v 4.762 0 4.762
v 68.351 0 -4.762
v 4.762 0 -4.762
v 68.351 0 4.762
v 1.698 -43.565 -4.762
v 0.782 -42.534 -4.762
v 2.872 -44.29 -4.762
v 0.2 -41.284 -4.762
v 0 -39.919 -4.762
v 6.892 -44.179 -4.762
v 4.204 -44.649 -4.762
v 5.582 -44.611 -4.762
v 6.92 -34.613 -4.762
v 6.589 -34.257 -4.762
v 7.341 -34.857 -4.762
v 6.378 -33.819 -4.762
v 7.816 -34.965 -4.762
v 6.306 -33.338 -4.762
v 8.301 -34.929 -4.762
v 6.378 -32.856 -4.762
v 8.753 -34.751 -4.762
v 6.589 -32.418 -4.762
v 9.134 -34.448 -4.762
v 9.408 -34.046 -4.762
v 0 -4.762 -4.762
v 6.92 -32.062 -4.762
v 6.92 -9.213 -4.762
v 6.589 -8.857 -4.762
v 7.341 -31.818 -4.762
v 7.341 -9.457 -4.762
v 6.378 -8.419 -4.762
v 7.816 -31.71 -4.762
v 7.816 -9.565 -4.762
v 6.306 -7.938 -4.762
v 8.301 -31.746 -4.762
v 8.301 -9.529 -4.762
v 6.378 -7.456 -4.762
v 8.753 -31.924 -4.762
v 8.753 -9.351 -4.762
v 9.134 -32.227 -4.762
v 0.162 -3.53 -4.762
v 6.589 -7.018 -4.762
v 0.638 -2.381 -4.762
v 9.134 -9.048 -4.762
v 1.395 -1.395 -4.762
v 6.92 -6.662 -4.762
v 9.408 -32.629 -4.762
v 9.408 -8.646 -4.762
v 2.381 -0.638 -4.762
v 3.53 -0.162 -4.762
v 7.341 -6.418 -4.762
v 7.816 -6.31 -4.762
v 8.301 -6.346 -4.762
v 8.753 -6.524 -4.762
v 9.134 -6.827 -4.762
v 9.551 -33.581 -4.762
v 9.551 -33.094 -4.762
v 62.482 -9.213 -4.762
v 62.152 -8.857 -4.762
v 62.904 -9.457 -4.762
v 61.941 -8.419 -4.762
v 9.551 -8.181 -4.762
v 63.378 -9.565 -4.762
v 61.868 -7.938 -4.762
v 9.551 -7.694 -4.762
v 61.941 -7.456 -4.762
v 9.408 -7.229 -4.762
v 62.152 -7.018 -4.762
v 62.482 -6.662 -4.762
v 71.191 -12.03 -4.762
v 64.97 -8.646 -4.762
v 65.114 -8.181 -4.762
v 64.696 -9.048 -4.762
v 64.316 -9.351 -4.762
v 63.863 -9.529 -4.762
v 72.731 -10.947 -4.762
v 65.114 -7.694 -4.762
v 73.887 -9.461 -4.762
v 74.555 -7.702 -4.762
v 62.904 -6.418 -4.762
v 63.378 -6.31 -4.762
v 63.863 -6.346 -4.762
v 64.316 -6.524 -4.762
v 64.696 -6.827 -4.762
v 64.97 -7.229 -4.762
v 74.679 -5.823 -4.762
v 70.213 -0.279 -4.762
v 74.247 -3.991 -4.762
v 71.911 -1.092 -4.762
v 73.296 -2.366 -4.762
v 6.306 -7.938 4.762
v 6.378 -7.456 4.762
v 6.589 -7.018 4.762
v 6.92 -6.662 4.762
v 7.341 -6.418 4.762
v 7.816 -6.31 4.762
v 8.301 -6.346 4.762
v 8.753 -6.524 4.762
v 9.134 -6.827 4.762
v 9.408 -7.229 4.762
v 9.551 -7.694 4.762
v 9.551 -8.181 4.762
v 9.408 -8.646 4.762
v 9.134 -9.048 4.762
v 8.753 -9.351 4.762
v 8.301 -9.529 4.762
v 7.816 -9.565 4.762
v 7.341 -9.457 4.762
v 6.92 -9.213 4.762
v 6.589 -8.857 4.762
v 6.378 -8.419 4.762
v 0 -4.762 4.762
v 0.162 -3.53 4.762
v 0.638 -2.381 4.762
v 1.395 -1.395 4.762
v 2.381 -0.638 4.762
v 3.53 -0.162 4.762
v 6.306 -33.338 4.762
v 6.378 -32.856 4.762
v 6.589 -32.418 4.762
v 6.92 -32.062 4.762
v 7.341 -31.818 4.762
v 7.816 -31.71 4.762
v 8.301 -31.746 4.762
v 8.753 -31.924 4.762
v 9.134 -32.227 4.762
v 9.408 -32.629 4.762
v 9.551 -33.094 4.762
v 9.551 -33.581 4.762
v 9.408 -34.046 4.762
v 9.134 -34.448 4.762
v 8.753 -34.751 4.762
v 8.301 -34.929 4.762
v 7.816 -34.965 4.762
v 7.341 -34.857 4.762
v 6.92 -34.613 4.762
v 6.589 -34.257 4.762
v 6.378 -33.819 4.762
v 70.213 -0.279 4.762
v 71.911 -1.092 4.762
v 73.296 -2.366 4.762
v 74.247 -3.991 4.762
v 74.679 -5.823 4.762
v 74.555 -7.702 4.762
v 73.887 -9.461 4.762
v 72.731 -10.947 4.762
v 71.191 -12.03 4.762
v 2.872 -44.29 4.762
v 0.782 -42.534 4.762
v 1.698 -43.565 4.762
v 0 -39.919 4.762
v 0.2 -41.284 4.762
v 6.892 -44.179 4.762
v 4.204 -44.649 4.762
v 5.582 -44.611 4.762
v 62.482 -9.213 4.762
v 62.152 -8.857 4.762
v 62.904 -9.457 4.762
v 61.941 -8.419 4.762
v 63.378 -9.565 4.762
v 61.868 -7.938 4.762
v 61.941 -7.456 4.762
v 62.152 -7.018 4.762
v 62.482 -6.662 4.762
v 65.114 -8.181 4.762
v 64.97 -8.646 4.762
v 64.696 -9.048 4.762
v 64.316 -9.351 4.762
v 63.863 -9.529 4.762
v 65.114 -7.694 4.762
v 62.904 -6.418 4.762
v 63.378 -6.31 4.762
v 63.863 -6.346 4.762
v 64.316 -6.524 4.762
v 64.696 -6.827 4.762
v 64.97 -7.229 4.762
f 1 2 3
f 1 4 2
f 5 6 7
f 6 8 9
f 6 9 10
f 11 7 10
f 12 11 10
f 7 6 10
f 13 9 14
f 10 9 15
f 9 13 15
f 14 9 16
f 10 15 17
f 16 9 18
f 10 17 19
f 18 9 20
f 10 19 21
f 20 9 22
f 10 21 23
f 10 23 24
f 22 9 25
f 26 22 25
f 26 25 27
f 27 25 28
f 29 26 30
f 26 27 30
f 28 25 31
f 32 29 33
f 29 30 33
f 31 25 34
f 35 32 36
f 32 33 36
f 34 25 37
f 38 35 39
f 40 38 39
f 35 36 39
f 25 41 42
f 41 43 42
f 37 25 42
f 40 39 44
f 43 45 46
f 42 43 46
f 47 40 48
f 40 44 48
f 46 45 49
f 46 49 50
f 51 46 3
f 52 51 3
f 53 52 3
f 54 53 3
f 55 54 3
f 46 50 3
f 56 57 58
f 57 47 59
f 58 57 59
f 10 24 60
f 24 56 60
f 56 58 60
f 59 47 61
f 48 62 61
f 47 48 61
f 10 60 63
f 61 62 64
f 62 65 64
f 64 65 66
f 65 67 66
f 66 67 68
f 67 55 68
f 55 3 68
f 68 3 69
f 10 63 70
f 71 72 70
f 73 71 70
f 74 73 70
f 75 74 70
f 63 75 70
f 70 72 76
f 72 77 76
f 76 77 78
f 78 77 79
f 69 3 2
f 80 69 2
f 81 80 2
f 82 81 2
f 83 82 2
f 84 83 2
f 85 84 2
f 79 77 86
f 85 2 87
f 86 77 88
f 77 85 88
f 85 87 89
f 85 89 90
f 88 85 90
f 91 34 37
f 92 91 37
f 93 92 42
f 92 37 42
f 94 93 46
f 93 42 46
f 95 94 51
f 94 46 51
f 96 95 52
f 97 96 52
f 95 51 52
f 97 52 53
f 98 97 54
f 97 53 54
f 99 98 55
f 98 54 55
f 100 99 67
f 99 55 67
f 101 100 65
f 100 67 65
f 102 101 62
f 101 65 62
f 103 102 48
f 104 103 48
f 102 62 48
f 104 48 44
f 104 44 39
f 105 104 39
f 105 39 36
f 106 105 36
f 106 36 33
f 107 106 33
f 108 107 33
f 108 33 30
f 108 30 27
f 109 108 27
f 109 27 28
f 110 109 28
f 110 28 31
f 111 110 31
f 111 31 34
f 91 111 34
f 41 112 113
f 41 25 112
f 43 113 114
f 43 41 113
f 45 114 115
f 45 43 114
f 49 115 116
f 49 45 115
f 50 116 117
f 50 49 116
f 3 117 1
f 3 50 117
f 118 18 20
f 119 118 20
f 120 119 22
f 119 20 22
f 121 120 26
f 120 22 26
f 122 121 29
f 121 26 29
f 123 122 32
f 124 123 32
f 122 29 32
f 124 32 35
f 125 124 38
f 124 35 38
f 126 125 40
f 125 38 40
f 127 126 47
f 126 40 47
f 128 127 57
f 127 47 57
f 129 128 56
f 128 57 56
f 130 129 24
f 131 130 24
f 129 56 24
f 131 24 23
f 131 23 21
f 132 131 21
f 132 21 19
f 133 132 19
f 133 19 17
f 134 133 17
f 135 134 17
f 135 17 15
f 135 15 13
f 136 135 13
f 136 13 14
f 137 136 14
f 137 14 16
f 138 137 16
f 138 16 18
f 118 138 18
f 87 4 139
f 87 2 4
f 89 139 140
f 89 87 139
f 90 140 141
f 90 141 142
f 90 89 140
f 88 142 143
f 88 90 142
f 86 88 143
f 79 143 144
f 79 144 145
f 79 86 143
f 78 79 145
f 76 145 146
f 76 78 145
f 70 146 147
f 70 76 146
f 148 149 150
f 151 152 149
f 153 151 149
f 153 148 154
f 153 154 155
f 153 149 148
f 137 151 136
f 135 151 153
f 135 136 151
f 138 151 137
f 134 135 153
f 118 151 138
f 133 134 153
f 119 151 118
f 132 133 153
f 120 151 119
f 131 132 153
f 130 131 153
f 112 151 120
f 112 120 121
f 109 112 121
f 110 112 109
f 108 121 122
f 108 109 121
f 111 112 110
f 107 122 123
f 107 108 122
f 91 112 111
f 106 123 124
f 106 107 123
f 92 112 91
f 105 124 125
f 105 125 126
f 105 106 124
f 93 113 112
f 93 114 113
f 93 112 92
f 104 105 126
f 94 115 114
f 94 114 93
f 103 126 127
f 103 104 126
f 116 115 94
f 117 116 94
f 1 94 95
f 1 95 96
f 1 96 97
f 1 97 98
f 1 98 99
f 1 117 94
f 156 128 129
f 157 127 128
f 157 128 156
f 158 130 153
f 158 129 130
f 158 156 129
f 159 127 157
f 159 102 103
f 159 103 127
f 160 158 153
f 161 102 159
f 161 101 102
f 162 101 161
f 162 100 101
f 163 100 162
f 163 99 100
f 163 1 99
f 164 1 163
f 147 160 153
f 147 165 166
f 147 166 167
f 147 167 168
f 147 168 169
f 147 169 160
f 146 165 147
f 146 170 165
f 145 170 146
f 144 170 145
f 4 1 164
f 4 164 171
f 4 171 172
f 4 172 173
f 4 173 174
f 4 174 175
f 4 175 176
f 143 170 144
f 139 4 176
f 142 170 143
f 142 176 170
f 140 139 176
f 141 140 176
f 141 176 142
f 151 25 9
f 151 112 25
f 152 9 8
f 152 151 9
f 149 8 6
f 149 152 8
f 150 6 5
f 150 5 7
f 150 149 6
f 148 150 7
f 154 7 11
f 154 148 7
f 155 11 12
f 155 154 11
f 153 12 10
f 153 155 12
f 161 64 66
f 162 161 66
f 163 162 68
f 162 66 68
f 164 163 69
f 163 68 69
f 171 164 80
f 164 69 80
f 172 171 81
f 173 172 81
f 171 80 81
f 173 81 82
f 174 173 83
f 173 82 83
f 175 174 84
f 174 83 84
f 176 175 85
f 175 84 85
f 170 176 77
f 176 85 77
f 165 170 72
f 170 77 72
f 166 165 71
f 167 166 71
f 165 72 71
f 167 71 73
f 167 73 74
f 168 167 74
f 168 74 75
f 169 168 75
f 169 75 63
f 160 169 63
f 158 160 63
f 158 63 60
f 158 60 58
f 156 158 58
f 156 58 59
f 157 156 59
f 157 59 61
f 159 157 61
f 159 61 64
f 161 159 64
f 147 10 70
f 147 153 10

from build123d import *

# Parameters (mm, degrees)
BOSS_EXTRUDE1_DEPTH       = 4.7625
F_4_CLEARANCE_HOLE1_D     = 3.2639
F_4_CLEARANCE_HOLE1_DEPTH = 12.7
F_4_CLEARANCE_HOLE1_TIP   = 0.980574487
FILLET1_R                 = 4.7625
FILLET2_R                 = 6.35


with BuildPart() as part:
    # Sketch1 → Boss-Extrude1 (new, symmetric)
    with BuildSketch(Plane.XY):
        Polygon((0, 0), (0, -47.625), (95.25, 0), align=None)
    extrude(amount=BOSS_EXTRUDE1_DEPTH, both=True)

    # #4 Clearance Hole1
    with Locations(Plane.XY.offset(4.7625)):
        with Locations((7.9375, -7.9375), (63.5, -7.9375), (7.9375, -33.3375)):
            Hole(F_4_CLEARANCE_HOLE1_D / 2, depth=F_4_CLEARANCE_HOLE1_DEPTH)
            with Locations((0, 0, -(F_4_CLEARANCE_HOLE1_DEPTH + F_4_CLEARANCE_HOLE1_TIP / 2))):  # 118° drill point
                Cone(0, F_4_CLEARANCE_HOLE1_D / 2, F_4_CLEARANCE_HOLE1_TIP, mode=Mode.SUBTRACT)

    # Fillet1
    fillet1_edges = [part.edges().sort_by_distance(p)[0] for p in [
        (0, -47.625, 0),
        (0, 0, 0),
    ]]
    fillet(fillet1_edges, radius=FILLET1_R)

    # Fillet2
    fillet2_edges = [part.edges().sort_by_distance(p)[0] for p in [
        (95.25, 0, 0),
    ]]
    fillet(fillet2_edges, radius=FILLET2_R)


solid = part.part
